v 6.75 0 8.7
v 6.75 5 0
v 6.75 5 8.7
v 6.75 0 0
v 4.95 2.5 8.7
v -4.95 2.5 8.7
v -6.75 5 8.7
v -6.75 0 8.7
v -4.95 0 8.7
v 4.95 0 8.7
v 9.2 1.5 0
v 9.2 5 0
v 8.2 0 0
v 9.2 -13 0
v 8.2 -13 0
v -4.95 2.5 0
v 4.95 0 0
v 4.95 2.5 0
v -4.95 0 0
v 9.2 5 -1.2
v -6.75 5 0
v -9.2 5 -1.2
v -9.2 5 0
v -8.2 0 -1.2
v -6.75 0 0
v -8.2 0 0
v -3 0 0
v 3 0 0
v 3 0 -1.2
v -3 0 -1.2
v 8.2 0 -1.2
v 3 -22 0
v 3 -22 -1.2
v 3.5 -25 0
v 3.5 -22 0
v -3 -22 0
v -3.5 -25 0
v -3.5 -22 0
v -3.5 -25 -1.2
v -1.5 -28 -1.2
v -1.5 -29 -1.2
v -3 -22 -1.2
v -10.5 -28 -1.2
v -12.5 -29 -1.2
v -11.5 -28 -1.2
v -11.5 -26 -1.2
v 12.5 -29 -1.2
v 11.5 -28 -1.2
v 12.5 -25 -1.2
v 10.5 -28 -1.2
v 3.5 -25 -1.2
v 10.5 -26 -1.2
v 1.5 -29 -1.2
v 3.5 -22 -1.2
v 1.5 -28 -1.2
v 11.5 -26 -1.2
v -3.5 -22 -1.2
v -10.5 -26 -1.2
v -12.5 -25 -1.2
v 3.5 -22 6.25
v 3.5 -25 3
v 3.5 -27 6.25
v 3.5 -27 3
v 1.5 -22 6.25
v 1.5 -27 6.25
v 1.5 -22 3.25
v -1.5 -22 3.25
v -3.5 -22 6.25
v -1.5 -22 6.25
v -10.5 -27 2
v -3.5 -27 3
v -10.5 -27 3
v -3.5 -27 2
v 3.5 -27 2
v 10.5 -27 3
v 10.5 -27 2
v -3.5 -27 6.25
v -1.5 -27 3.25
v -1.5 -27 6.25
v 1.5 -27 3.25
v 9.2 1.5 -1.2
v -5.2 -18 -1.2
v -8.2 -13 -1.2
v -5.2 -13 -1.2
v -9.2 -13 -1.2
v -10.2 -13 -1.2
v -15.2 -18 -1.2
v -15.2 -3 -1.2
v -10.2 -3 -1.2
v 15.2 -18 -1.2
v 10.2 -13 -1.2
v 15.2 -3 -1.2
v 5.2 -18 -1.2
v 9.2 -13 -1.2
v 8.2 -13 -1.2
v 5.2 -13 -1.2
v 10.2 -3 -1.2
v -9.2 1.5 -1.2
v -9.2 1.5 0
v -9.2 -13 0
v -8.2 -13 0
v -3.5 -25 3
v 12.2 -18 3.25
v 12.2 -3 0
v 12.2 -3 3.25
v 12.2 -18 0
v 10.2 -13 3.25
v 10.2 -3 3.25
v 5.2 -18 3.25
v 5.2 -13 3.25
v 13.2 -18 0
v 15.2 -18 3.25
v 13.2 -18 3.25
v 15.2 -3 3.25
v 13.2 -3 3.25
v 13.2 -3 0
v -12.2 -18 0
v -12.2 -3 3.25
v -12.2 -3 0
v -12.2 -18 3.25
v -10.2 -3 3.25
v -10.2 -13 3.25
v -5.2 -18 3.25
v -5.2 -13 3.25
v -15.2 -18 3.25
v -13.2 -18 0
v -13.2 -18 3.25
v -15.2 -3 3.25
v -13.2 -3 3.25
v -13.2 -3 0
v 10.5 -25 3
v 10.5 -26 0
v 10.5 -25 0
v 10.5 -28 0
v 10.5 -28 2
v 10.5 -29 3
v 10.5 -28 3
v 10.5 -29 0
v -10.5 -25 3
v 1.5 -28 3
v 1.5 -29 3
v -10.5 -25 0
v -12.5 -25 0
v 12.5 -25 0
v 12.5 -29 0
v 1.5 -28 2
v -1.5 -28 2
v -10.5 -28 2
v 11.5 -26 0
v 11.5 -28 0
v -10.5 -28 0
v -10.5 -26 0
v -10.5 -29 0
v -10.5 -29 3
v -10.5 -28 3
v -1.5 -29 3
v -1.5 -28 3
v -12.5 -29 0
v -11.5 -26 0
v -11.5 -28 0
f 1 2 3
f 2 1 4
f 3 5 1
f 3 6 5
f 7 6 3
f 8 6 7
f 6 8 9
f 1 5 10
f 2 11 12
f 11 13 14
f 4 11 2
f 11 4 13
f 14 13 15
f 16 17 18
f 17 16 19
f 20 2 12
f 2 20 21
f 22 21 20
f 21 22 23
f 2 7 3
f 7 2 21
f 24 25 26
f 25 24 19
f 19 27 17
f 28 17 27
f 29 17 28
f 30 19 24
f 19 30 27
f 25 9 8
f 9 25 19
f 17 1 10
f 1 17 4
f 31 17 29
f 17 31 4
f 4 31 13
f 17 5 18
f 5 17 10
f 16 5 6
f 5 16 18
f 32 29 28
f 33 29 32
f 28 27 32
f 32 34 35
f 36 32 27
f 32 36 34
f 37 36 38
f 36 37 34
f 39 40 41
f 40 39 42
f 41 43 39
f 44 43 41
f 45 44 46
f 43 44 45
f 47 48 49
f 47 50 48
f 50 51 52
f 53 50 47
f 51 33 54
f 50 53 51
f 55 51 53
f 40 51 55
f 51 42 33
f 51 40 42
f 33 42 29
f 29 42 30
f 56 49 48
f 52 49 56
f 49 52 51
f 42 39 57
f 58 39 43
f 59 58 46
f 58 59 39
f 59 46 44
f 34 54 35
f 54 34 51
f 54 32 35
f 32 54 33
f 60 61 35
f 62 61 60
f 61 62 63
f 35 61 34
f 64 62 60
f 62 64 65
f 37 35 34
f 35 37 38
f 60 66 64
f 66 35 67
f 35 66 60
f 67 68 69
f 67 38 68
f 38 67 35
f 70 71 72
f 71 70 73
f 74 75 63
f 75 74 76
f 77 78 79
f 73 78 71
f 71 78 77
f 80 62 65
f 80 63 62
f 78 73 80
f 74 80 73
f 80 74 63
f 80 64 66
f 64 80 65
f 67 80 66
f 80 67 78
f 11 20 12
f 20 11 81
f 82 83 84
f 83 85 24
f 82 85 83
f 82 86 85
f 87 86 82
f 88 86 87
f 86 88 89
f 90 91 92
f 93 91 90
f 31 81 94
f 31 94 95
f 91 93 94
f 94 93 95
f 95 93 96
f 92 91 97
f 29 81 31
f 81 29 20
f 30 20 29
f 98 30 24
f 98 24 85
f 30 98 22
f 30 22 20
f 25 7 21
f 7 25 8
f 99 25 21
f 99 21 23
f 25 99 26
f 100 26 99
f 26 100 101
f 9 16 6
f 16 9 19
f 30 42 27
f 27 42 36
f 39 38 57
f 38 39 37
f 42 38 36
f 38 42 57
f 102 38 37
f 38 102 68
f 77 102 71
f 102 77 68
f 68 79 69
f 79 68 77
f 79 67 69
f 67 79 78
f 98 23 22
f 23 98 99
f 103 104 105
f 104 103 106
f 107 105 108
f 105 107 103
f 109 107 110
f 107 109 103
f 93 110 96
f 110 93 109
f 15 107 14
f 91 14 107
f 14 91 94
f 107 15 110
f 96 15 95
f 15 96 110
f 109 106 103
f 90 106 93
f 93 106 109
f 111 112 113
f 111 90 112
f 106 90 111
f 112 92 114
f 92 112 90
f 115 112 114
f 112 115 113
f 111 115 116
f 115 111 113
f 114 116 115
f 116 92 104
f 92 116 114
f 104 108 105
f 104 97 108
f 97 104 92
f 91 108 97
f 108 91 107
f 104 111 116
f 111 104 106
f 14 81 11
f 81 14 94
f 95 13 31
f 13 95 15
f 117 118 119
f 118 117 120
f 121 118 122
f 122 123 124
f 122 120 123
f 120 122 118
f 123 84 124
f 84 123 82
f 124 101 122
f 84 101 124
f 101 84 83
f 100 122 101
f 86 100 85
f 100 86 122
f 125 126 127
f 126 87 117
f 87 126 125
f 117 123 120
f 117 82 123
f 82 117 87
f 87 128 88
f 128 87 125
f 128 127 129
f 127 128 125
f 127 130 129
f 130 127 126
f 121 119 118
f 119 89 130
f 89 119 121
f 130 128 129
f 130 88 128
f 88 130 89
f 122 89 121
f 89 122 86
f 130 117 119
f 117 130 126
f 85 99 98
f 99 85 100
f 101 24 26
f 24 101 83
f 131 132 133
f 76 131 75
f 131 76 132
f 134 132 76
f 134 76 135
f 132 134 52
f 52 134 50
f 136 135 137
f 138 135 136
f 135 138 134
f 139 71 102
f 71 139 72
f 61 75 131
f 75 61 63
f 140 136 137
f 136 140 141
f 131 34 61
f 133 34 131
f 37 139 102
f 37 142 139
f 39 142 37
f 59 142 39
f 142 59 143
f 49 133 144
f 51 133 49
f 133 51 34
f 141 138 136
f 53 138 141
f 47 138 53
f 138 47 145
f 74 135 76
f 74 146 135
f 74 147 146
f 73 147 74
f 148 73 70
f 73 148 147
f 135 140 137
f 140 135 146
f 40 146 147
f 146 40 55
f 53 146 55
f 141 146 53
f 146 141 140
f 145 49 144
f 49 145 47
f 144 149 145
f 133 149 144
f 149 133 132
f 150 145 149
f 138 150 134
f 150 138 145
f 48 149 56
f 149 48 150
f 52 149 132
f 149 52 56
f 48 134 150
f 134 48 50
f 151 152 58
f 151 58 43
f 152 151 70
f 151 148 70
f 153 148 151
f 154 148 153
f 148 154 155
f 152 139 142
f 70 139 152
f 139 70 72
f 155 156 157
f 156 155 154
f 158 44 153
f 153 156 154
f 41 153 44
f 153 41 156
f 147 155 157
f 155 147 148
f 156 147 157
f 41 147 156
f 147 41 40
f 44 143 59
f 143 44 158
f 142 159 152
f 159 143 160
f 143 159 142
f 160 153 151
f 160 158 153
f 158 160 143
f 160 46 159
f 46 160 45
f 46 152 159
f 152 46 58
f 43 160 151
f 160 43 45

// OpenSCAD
/* Pole holder centered on the holder */
module poleHolder(radius,headradius,pivotlength)
{
  translate(v=[-radius-2,-2.5,0])
  {
    difference()
    {
      translate(v=[0,0,-1.2])
        cube(size=[2*radius+4,5,headradius+radius+1.2]);
      translate(v=[2,0,headradius-radius])
        cube(size=[2*radius,5,2*radius]);
    }
  }

  translate(v=[-0.5,0,-1.2])
    cube(size=[1.0,pivotlength,0.8]);
}

/* Pole holder centered on the holder */
module poleHolderNoUpright(radius,headradius,pivotlength)
{
  translate(v=[-radius,-2.5,0])
  {
    translate(v=[-2,0,-1.2])
      cube(size=[2*radius+4,5,headradius-radius+1.2]);
    translate(v=[2*radius+3,0,-1.2])
      cube(size=[2,15,headradius-radius+1.2]);
    translate(v=[2*radius,0,-1.2])
      cube(size=[2,15,headradius-radius+1.2]);
    translate(v=[2*radius+2,0,-1.2])
      cube(size=[1,15,1.2]);
  }

  translate(v=[-0.5,0,-1.2])
    cube(size=[1.0,pivotlength,1.2]);
}

module halfRelay(radius,headradius)
{
  /* Half a nail head holder */
  difference()
  {
    cube(size=[headradius+2,5,2*headradius-0.8]);

    cube(size=[headradius+0.2,2.5,2*headradius-0.8]);
  }

  translate(v=[0,0,-1.2])
    cube(size=[headradius+4.45,5,1.2]);

  translate(v=[0,-27,-1.2])
  {
    cube(size=[3,27,1.2]);

    cube(size=[3.5,5,1.2]);
  }

  /* Half a nail stem holder */
  translate(v=[0,-27,0])
    difference()
    {
      cube(size=[radius+2,5,headradius+radius]);
      translate(v=[0,0,headradius-radius])
        cube(size=[radius,5,2*radius]);
    }

}

module poleHolder(radius,headradius)
{
  translate(v=[8.7,-15.5,0])
    rotate([0,0,-0.0])
      poleHolderNoUpright(radius,headradius,17);
}

module stationaryContact()
{
    translate(v=[-3.5,-29,-1.2])
    {
      difference()
      {
        cube(size=[14,4,3+1.2]);

        translate(v=[0,1,3.2])
          cube(size=[14,1,1.0]);

        cube(size=[5,1,3+1.2]);
      }

      translate(v=[14,0,0])
        difference()
        {
          cube(size=[2,4,1.2]);

          translate(v=[0,1,0])
            cube(size=[1,2,1.2]);
        }
    }
}

difference()
{
  union()
  {
    halfRelay(1.5,4.75);
    mirror([1,0,0])
      halfRelay(1.5,4.75);

    poleHolder(1.5,4.75);

    mirror([1,0,0])
      poleHolder(1.5,4.75);

    stationaryContact();

    mirror([1,0,0])
      stationaryContact();
  }
}
